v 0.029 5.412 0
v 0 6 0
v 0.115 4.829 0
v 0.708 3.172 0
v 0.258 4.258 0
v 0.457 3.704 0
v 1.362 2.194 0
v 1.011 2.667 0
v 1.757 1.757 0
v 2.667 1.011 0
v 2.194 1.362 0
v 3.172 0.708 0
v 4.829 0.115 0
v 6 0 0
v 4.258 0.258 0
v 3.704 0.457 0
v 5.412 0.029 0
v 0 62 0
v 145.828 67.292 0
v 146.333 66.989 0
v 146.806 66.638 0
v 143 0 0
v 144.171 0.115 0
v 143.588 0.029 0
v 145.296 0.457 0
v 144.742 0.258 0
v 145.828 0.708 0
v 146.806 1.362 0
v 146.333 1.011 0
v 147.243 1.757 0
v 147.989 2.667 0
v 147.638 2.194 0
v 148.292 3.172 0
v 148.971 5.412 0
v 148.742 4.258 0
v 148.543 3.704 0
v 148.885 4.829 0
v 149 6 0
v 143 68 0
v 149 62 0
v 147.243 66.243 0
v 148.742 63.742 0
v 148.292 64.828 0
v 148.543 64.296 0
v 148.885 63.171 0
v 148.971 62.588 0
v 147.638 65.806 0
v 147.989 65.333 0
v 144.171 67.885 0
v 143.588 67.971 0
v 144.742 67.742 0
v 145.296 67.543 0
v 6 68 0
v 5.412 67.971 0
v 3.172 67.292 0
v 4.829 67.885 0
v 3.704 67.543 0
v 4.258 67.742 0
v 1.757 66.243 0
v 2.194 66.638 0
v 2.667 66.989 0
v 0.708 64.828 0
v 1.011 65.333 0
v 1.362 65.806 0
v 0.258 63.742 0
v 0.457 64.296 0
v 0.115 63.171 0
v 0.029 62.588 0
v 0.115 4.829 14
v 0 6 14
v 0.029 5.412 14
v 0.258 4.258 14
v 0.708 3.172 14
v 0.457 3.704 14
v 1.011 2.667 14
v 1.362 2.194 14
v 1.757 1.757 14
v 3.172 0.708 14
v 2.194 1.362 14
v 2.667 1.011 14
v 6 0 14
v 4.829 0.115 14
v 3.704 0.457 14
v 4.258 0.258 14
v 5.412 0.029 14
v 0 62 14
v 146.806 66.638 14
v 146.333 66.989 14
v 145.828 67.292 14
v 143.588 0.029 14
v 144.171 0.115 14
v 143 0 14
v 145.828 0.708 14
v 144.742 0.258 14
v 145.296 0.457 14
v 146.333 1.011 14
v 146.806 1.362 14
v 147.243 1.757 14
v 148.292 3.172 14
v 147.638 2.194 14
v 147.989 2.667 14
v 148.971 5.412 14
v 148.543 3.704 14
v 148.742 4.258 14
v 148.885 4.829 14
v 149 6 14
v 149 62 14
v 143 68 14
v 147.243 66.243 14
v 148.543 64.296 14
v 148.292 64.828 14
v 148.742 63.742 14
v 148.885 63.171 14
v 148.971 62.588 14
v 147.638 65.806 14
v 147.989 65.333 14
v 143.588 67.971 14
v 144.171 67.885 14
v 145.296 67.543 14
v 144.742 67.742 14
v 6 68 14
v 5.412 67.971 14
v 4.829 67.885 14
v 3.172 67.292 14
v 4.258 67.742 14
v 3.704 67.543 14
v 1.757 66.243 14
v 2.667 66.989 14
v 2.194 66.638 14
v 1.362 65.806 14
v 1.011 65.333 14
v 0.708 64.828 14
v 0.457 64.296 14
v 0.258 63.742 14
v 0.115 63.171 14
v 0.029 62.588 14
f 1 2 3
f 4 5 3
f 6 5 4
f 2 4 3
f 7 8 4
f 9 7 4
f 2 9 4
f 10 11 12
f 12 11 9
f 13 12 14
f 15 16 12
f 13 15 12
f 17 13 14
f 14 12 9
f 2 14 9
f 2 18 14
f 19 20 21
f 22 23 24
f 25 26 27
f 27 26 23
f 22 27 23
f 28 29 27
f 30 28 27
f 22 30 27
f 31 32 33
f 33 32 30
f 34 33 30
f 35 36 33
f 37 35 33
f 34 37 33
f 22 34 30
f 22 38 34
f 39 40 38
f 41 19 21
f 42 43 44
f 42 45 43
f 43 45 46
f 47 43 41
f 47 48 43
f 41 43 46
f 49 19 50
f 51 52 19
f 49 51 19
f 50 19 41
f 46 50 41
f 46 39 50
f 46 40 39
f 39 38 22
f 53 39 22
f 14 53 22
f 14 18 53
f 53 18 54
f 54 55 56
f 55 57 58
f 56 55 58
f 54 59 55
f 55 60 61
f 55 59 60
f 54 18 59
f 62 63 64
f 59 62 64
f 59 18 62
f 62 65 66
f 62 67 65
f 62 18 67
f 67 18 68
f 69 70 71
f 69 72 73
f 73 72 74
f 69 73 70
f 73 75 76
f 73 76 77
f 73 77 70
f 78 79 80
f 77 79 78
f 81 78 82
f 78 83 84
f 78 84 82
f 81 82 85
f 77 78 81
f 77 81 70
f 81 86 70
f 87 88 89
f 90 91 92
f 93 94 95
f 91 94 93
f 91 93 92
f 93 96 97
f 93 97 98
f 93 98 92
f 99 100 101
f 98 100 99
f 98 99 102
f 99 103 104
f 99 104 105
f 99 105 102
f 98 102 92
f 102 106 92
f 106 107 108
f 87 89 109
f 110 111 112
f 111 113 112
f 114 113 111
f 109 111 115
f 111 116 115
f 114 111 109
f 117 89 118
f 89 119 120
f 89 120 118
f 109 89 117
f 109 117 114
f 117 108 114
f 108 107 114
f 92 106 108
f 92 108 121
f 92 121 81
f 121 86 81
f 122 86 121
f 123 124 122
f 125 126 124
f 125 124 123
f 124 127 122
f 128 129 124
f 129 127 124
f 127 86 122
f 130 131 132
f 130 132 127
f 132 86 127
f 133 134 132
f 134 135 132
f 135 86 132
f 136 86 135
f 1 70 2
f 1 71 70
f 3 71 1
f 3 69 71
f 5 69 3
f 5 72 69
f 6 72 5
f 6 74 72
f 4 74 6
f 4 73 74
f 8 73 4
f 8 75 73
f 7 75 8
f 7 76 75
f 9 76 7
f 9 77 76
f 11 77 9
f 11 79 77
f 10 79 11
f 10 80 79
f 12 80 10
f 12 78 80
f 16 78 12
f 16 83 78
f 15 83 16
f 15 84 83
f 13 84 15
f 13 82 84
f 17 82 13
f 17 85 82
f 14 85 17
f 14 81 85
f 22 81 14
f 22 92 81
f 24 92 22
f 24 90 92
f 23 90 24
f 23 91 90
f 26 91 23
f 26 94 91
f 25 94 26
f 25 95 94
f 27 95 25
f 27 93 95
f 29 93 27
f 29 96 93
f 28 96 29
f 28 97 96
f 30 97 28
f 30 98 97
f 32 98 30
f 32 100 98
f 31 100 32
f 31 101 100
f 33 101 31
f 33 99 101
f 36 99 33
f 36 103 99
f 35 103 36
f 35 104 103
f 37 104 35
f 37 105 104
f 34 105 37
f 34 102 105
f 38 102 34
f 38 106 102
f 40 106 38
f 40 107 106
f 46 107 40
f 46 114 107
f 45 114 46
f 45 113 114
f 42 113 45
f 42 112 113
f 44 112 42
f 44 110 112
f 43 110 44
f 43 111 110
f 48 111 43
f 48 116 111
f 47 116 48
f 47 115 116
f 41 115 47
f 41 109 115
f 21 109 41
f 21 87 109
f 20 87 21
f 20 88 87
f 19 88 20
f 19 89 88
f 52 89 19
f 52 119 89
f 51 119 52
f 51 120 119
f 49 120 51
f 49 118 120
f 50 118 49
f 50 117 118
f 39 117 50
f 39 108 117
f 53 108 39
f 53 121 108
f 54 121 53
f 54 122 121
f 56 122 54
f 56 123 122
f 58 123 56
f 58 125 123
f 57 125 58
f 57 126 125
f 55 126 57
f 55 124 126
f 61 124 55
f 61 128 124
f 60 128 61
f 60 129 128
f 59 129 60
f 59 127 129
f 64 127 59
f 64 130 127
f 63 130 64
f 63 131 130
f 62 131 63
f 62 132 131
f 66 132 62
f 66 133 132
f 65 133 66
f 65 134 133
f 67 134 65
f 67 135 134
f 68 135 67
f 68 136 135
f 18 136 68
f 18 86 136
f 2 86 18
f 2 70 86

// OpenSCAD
include <../common.scad>
// External envelope/radius in common.scad.
module powerbank(){color([0.07,0.08,0.09])rounded_box([bank_l,bank_w,bank_t],bank_corner_r);}
powerbank();
